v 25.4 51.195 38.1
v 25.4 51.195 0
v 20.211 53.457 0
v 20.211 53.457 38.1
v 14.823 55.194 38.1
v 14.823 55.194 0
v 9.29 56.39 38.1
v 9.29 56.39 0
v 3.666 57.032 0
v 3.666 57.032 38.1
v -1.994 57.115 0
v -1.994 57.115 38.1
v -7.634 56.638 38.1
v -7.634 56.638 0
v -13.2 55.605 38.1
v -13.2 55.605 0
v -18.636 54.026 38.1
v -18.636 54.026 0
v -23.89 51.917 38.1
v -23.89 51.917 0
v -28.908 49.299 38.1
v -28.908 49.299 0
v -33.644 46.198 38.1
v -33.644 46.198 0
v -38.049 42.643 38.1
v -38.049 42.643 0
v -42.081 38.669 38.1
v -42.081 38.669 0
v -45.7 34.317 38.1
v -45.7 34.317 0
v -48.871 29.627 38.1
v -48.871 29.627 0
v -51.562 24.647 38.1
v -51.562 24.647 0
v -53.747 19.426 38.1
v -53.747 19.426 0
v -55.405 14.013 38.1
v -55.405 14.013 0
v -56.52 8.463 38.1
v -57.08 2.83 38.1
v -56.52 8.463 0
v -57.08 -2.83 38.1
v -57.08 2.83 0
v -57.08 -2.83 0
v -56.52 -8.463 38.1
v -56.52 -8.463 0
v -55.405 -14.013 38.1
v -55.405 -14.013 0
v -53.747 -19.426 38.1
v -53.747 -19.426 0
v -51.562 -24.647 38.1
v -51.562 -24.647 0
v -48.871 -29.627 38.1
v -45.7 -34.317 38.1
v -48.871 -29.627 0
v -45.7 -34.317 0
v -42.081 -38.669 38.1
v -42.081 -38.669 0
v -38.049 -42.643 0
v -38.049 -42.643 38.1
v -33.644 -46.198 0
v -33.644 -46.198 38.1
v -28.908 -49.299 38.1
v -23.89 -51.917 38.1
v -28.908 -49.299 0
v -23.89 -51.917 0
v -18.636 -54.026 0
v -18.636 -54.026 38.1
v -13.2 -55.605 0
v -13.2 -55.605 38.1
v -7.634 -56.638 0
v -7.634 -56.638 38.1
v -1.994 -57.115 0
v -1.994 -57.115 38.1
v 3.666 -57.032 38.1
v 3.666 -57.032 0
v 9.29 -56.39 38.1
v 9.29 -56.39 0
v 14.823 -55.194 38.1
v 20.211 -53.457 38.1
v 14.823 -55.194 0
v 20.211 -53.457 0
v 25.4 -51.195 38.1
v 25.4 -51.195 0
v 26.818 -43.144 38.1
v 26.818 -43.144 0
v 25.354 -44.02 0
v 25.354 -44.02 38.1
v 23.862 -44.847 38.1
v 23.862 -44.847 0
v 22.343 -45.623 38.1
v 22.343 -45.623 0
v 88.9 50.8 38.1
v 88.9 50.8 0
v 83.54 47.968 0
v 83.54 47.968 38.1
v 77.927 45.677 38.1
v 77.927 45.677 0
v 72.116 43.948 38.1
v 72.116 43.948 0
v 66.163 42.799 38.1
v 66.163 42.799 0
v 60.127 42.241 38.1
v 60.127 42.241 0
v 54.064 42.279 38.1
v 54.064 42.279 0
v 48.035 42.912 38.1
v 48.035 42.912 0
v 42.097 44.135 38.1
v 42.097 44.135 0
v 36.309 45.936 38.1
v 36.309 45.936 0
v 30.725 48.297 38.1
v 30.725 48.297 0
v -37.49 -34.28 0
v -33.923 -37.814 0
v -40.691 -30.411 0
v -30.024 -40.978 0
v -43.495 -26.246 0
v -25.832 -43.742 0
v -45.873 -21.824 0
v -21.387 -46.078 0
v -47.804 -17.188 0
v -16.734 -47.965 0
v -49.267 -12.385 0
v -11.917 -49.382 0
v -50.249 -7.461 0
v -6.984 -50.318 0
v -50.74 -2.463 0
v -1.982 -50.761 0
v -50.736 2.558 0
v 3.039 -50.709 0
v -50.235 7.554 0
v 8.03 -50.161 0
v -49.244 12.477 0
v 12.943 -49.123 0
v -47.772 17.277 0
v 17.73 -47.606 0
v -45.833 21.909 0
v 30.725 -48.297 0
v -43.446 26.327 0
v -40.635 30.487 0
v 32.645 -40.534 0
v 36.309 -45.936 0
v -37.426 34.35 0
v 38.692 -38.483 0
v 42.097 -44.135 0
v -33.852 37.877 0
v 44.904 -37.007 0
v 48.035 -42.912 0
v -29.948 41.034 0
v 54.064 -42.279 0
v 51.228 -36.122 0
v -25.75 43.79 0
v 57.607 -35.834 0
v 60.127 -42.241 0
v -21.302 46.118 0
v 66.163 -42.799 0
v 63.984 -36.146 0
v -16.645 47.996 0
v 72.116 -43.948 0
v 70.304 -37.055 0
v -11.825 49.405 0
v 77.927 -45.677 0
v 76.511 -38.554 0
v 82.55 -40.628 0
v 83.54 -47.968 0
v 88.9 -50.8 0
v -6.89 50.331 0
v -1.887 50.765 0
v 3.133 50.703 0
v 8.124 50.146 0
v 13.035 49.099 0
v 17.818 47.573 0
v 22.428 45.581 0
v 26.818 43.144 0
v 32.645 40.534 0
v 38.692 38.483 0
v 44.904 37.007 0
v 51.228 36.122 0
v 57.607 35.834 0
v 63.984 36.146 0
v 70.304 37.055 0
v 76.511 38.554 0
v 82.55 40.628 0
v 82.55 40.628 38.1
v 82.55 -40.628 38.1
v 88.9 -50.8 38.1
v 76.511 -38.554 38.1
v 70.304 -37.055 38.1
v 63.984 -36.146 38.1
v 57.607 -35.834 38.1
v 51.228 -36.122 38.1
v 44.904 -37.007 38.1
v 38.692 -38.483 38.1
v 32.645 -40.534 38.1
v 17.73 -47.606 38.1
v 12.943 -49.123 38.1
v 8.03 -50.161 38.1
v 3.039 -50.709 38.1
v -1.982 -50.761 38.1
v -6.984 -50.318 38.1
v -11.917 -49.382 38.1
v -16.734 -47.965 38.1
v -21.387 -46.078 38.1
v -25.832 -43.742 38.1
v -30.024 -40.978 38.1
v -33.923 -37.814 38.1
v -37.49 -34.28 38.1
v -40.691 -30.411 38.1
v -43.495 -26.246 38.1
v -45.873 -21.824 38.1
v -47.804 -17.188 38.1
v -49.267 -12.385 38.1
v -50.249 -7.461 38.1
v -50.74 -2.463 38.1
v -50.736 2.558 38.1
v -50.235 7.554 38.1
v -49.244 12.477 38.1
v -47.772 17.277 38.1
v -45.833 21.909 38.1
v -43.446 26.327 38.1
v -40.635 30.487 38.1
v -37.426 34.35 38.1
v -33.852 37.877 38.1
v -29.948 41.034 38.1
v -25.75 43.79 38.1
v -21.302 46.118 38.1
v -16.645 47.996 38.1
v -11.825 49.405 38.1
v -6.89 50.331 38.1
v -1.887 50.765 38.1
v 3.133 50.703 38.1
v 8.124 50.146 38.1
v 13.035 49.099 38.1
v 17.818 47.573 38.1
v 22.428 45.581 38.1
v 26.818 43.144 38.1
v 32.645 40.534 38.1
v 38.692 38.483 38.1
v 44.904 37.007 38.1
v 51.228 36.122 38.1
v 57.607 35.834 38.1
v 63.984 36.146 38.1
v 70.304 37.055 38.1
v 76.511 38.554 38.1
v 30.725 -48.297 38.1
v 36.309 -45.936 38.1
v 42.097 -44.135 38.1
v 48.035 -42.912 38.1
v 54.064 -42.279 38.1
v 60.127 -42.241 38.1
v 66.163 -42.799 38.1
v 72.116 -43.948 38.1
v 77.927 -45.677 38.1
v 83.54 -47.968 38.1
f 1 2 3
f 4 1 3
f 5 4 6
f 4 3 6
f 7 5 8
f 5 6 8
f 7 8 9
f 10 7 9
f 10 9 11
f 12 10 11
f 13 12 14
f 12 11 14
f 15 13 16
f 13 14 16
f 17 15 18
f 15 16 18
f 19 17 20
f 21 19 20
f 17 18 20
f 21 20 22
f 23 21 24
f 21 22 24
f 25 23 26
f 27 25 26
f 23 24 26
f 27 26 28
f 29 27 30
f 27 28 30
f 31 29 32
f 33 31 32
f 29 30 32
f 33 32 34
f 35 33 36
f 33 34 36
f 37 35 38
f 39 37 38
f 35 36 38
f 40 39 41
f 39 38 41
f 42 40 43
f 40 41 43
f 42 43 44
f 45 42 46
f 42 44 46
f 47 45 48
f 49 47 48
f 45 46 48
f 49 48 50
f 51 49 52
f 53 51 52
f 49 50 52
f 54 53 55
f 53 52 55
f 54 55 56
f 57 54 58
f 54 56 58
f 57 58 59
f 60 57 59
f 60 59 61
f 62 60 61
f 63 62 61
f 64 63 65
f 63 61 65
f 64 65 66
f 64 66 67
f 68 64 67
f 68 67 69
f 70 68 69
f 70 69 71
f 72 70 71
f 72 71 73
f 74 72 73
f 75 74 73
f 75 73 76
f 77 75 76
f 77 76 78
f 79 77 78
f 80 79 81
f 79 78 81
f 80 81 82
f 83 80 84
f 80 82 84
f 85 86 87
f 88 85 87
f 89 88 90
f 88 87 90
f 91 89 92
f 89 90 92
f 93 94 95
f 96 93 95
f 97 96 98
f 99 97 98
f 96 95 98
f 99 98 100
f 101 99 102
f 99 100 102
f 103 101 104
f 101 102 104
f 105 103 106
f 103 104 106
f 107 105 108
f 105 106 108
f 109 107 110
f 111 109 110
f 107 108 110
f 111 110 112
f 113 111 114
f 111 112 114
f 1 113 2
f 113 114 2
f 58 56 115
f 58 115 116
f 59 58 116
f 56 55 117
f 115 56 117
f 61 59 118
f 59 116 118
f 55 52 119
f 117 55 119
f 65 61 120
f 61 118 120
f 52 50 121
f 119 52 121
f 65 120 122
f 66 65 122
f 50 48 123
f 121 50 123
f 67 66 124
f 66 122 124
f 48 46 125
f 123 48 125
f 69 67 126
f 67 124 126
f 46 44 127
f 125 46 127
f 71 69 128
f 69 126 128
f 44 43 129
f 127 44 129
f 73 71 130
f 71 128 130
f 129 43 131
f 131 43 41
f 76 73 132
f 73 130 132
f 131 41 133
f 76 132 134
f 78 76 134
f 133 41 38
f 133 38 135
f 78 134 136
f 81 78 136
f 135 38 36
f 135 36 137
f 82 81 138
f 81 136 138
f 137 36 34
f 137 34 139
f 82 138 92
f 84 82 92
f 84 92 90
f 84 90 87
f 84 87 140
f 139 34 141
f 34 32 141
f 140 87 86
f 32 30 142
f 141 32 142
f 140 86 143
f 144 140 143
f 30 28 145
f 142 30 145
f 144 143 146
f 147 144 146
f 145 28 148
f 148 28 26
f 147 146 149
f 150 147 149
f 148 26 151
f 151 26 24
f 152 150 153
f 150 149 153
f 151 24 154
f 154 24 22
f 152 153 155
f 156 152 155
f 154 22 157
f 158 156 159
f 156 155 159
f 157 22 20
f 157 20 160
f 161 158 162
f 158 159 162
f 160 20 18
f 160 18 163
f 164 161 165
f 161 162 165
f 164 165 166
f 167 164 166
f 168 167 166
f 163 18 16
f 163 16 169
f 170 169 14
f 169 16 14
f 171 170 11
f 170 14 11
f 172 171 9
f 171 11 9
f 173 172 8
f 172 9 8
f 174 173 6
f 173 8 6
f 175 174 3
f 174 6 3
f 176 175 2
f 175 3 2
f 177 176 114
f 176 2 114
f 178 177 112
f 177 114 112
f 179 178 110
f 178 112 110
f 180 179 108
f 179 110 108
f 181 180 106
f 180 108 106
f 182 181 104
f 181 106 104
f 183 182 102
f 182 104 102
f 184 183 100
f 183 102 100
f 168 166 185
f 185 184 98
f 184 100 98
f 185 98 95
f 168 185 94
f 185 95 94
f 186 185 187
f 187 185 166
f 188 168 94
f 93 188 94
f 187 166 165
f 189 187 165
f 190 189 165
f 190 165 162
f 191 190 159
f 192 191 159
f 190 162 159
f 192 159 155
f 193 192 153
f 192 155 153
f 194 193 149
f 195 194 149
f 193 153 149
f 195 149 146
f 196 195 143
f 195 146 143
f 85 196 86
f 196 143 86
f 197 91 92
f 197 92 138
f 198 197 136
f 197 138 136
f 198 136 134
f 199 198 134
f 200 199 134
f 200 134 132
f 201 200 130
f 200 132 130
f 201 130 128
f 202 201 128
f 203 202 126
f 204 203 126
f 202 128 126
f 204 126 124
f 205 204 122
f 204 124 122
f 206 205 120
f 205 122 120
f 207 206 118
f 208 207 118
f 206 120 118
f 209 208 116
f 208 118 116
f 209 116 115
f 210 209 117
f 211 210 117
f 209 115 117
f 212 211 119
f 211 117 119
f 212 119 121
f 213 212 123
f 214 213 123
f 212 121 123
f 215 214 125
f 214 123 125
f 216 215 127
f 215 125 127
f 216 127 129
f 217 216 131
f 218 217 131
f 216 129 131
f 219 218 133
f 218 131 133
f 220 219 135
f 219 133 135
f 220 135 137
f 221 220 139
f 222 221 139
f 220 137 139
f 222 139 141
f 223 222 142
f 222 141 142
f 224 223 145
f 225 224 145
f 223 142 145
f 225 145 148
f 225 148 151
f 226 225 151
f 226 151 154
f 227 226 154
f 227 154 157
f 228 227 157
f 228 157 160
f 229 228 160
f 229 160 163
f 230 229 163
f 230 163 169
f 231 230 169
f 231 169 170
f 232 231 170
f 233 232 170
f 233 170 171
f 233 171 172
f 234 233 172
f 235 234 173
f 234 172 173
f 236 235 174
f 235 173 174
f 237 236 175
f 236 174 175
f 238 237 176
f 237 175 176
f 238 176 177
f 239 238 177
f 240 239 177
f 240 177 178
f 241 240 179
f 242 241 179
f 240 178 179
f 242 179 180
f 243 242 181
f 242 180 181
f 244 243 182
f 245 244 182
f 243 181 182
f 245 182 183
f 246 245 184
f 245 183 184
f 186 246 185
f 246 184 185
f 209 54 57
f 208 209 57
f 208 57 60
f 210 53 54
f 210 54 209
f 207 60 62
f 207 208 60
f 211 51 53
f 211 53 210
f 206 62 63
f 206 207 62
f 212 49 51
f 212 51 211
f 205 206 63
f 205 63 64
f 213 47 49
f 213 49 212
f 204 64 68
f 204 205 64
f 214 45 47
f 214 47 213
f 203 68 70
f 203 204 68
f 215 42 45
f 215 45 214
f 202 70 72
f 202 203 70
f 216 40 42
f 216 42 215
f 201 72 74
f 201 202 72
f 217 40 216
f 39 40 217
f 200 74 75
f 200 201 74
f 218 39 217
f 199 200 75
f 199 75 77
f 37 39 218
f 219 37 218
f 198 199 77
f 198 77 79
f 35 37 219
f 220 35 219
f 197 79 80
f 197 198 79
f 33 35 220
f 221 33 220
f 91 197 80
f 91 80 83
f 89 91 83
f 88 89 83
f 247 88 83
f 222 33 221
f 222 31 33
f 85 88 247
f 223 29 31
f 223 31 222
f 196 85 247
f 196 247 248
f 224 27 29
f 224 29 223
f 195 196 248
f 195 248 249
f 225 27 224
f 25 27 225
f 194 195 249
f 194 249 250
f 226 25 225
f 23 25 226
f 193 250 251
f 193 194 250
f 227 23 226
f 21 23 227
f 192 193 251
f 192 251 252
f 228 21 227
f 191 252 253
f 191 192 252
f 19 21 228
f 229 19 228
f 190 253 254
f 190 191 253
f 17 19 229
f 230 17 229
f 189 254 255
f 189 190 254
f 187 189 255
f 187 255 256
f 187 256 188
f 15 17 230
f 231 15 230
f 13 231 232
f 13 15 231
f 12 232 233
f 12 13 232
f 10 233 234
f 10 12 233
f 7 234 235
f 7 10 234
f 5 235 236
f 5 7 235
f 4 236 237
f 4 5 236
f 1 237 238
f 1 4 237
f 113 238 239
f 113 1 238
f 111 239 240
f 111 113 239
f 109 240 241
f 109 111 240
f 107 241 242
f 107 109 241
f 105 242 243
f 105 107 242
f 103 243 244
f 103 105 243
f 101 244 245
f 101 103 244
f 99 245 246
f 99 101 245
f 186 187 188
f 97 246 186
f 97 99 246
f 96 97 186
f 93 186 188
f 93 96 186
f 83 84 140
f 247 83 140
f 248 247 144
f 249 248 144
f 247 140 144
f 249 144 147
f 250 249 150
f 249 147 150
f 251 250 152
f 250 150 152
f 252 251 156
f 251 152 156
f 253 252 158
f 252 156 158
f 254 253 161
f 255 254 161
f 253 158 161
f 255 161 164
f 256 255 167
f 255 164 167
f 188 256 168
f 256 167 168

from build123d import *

# Parameters (mm, degrees)
BOSS_EXTRUDE1_DEPTH = 38.1


with BuildPart() as part:
    # Sketch1 → Boss-Extrude1 (new body)
    with BuildSketch(Plane.XY):
        with BuildLine():
            Line((88.9, -50.8), (88.9, 50.8))
            ThreePointArc((88.9, 50.8), (57.095135122, 42.185130239), (25.4, 51.195336702))
            ThreePointArc((25.4, 51.195336702), (-57.15, 0), (25.4, -51.195336702))
            ThreePointArc((25.4, -51.195336702), (57.095135122, -42.185130239), (88.9, -50.8))
        make_face()
        with BuildLine():
            ThreePointArc((82.55, -40.628164989), (54.413891048, -35.903084421), (26.818032813, -43.144328898))
            ThreePointArc((26.818032813, -43.144328898), (24.611630749, -44.439932852), (22.342791686, -45.622797587))
            ThreePointArc((22.342791686, -45.622797587), (-50.735562995, 2.557859955), (26.818032813, 43.144328898))
            ThreePointArc((26.818032813, 43.144328898), (54.413891048, 35.903084421), (82.55, 40.628164989))
            Line((82.55, 40.628164989), (82.55, -40.628164989))
        make_face(mode=Mode.SUBTRACT)
    extrude(amount=BOSS_EXTRUDE1_DEPTH)


solid = part.part
